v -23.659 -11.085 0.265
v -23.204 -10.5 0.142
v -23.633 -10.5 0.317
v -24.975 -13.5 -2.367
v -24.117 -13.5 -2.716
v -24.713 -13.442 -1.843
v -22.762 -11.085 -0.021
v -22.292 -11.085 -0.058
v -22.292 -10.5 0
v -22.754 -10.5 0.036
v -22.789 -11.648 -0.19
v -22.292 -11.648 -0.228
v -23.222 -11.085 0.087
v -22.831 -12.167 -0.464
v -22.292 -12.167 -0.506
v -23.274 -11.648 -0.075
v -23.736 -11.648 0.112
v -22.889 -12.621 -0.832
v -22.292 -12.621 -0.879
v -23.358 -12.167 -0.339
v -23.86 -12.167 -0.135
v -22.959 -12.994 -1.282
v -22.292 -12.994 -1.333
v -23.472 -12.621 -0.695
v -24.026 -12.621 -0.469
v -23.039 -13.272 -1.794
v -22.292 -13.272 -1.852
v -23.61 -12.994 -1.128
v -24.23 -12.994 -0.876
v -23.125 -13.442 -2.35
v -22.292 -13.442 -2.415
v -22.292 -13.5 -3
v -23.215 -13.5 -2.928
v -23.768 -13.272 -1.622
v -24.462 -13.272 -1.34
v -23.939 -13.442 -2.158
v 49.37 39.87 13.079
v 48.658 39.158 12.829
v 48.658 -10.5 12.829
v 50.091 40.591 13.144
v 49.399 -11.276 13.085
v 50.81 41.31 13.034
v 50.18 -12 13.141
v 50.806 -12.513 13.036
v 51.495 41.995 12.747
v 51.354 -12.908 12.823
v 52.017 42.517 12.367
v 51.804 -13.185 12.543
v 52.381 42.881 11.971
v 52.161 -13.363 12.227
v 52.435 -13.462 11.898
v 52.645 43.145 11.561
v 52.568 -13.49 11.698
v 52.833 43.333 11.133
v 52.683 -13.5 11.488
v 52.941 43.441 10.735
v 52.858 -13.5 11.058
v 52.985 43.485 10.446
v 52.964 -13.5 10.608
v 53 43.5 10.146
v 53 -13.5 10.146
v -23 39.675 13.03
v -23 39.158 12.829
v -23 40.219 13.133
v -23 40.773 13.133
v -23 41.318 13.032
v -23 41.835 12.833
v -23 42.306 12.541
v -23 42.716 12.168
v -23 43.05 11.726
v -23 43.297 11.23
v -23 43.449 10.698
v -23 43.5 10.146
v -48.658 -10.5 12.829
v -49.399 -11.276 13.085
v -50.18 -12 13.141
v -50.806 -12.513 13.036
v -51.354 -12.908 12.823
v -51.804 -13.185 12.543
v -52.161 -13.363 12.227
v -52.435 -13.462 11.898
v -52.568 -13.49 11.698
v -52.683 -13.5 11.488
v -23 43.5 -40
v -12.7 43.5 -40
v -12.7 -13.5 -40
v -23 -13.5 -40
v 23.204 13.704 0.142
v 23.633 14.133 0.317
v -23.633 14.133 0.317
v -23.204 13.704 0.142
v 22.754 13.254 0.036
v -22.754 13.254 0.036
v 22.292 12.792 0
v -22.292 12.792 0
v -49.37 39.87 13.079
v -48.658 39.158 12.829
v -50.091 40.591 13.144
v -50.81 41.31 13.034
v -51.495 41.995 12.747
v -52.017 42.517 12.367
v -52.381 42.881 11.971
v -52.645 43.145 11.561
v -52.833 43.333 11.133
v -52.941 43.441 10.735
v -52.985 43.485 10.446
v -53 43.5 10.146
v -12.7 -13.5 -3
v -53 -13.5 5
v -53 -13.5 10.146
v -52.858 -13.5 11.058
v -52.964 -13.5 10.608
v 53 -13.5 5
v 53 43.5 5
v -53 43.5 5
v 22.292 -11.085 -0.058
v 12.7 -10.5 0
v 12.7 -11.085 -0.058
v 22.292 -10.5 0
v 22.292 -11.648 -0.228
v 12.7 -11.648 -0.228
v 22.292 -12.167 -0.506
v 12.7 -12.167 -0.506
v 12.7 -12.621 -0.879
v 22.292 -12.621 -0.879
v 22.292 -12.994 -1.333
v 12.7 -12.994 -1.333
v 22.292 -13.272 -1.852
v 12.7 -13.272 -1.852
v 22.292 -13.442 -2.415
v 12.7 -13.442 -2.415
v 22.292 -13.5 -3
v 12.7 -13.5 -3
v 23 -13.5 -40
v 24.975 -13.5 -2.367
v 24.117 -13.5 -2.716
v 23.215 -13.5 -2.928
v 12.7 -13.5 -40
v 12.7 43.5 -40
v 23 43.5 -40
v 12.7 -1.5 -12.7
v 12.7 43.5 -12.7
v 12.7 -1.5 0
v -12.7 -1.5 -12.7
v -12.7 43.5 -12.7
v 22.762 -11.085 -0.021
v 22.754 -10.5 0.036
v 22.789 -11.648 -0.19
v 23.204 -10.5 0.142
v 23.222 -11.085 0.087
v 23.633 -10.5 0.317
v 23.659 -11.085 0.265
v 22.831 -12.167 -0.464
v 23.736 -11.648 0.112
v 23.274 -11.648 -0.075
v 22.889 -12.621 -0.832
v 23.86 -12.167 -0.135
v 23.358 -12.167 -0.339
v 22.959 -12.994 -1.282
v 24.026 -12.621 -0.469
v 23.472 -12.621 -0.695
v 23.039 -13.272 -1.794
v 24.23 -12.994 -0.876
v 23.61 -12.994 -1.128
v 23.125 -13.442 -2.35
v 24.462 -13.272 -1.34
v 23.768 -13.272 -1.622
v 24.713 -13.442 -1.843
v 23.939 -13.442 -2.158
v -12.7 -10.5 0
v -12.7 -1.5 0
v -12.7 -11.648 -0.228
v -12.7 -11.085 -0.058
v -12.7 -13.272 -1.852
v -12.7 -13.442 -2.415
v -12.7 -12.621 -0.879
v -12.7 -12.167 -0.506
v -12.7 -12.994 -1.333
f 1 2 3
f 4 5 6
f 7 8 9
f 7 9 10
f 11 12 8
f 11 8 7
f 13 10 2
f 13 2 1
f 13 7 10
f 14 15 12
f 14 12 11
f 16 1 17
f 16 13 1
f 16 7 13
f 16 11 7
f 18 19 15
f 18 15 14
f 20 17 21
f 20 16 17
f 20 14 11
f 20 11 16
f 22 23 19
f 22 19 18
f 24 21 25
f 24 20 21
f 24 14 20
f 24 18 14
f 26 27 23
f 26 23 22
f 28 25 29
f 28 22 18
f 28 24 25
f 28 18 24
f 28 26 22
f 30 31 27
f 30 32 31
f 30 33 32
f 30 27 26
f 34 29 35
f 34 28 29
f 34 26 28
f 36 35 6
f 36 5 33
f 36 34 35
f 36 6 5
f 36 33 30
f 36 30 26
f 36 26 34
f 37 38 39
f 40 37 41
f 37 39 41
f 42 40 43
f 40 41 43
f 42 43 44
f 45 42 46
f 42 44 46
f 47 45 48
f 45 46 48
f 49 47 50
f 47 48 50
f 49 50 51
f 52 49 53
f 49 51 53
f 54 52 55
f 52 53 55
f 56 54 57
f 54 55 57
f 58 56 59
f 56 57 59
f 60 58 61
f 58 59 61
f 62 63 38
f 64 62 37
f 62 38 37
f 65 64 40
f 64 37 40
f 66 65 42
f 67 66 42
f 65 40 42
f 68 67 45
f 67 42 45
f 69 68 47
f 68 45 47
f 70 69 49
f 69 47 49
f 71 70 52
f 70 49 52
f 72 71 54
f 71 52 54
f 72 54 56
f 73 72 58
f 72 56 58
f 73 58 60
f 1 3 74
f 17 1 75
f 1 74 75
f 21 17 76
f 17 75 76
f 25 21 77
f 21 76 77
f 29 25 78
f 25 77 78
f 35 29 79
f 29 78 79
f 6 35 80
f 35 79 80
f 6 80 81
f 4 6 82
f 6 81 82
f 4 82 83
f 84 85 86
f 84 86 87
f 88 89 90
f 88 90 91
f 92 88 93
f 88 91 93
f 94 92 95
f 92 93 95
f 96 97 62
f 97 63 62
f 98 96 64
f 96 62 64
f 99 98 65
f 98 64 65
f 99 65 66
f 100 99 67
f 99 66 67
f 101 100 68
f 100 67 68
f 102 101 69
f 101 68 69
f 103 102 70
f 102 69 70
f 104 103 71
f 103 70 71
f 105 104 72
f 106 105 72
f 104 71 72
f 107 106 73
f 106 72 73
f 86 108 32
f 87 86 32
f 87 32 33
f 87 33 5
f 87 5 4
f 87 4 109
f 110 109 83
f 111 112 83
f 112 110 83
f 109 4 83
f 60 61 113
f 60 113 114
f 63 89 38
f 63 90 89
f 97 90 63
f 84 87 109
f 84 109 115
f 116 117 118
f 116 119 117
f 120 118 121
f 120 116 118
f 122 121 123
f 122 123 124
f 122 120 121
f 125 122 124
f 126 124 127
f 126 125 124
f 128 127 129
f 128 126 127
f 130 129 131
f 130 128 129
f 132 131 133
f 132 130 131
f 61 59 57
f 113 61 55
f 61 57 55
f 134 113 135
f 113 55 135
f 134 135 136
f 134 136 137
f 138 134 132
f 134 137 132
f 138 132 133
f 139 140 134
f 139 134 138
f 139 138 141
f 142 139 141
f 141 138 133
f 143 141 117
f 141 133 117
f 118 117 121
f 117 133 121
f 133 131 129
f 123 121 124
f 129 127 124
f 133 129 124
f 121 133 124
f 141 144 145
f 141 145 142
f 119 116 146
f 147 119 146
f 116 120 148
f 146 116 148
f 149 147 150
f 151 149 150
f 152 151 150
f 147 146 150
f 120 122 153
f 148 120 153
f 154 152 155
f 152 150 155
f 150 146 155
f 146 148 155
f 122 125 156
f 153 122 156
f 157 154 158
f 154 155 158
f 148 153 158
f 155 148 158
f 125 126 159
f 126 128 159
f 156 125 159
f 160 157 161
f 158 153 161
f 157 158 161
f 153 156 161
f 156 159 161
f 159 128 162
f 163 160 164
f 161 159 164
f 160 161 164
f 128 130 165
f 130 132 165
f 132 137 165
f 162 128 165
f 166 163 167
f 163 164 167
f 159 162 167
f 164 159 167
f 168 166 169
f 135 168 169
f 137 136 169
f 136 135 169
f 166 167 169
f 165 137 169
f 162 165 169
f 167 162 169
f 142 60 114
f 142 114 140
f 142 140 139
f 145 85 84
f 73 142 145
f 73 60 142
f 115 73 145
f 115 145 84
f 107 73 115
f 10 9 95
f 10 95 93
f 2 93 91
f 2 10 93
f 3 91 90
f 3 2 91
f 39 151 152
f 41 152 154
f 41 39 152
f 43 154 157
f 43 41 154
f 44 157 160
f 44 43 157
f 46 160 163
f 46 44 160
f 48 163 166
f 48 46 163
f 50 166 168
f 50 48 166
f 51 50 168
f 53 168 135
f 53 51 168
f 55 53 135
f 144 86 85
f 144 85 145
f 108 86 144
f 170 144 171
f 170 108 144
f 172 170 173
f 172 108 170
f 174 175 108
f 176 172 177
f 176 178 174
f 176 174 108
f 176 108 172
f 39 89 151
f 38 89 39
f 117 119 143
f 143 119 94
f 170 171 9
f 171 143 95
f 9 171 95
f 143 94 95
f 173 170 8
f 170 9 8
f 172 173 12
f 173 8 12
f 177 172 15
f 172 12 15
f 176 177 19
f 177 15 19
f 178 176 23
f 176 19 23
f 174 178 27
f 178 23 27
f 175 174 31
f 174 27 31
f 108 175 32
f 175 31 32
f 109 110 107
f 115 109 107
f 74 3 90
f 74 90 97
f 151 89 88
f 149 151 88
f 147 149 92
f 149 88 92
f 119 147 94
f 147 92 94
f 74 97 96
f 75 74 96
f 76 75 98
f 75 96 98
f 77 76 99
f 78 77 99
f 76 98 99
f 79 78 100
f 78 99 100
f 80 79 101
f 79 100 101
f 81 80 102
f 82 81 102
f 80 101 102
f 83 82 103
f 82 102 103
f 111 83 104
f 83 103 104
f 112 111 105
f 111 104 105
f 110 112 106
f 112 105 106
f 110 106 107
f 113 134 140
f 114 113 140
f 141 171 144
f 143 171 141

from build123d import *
from OCP.BRepFilletAPI import BRepFilletAPI_MakeChamfer

# Parameters (mm, degrees)
BOSS_EXTRUDE1_DEPTH = 15
SKETCH4_W           = 106
SKETCH4_H           = 57
BOSS_EXTRUDE3_DEPTH = 40
SKETCH5_W           = 25.4
SKETCH5_H           = 12.7
CUT_EXTRUDE3_DEPTH  = 12
SKETCH5_3_W         = 25.4
SKETCH5_3_H         = 27.3
CUT_EXTRUDE4_DEPTH  = 88.509999429
CHAMFER3_SIZE       = 45
CHAMFER3_SIZE2      = 30
FILLET2_R           = 3


with BuildPart() as part:
    # Sketch1 → Boss-Extrude1 (new body)
    with BuildSketch(Plane.XY):
        Polygon((23, -13.5), (53, -13.5), (53, 43.5), (-53, 43.5), (-53, -13.5), (-23, -13.5), (-23, 13.5), (23, 13.5), align=None)
    extrude(amount=BOSS_EXTRUDE1_DEPTH)

    # Chamfer1
    # the kernel refuses this chamfer: 30, 15 mm, written as the material it takes off along each edge
    with BuildSketch(Plane(origin=(23, 13.5, 15), x_dir=(-0.06891834360170887, 0, -0.9976223042390325), z_dir=(0, -1, 0)), Plane(origin=(-23, -13.5, 15), x_dir=(0.06891834360170887, 0, -0.9976223042390325), z_dir=(0, 1, 0))) as chamfer1_piece_1:
        with BuildLine():
            Line((15.573685801, 0), (-2.676901546, 30.962444281))
            Line((-2.676901546, 30.962444281), (-3.275474928, 30.921093275))
            ThreePointArc((-3.275474928, 30.921093275), (-1.669334001, 15.458363867), (-0.598573383, -0.041351006))
            Line((-0.598573383, -0.041351006), (0.041351006, -0.598573383))
            ThreePointArc((0.041351006, -0.598573383), (7.791208443, -0.063193073), (15.615036807, -0.598573383))
            Line((15.615036807, -0.598573383), (15.573685801, 0))
        make_face()
    extrude(amount=27, mode=Mode.SUBTRACT)
    with BuildSketch(Plane(origin=(-23, 13.5, 15), x_dir=(0, -0.06891834360170876, -0.9976223042390325), z_dir=(1, 0, 0))) as chamfer1_piece_2:
        with BuildLine():
            Line((15.573685801, 0), (-2.676901546, 30.962444281))
            Line((-2.676901546, 30.962444281), (-3.275474928, 30.921093275))
            ThreePointArc((-3.275474928, 30.921093275), (-1.669334001, 15.458363867), (-0.598573383, -0.041351006))
            Line((-0.598573383, -0.041351006), (0.041351006, -0.598573383))
            ThreePointArc((0.041351006, -0.598573383), (7.791208443, -0.063193073), (15.615036807, -0.598573383))
            Line((15.615036807, -0.598573383), (15.573685801, 0))
        make_face()
    extrude(amount=46, mode=Mode.SUBTRACT)
    with BuildSketch(Plane(origin=(-23, 13.5, 15), x_dir=(0, -0.06891834360170876, -0.9976223042390325), z_dir=(1, 0, 0))) as chamfer1_piece_3a_section:
        with BuildLine():
            Line((15.573685801, 0), (-2.676901546, 30.962444281))
            Line((-2.676901546, 30.962444281), (-3.275474928, 30.921093275))
            ThreePointArc((-3.275474928, 30.921093275), (-1.669334001, 15.458363867), (-0.598573383, -0.041351006))
            Line((-0.598573383, -0.041351006), (0.041351006, -0.598573383))
            ThreePointArc((0.041351006, -0.598573383), (7.791208443, -0.063193073), (15.615036807, -0.598573383))
            Line((15.615036807, -0.598573383), (15.573685801, 0))
        make_face()
    chamfer1_piece_3a = extrude(amount=123.694866214, mode=Mode.PRIVATE)
    chamfer1_piece_3a = split(chamfer1_piece_3a, bisect_by=Plane(origin=(23, 23.617605247, 10.241766787), z_dir=(1, 0, 0)), keep=Keep.TOP, mode=Mode.PRIVATE)
    with BuildSketch(Plane(origin=(23, 91.194866214, 15), x_dir=(-0.06891834360170887, 0, -0.9976223042390325), z_dir=(0, -1, 0))) as chamfer1_piece_3b_section:
        with BuildLine():
            Line((15.573685801, 0), (-2.676901546, 30.962444281))
            Line((-2.676901546, 30.962444281), (-3.275474928, 30.921093275))
            ThreePointArc((-3.275474928, 30.921093275), (-1.669334001, 15.458363867), (-0.598573383, -0.041351006))
            Line((-0.598573383, -0.041351006), (0.041351006, -0.598573383))
            ThreePointArc((0.041351006, -0.598573383), (7.791208443, -0.063193073), (15.615036807, -0.598573383))
            Line((15.615036807, -0.598573383), (15.573685801, 0))
        make_face()
    chamfer1_piece_3b = extrude(amount=104.694866214, mode=Mode.PRIVATE)
    chamfer1_piece_3b = split(chamfer1_piece_3b, bisect_by=Plane(origin=(33.117605247, 13.5, 10.241766787), z_dir=(0, 1, 0)), keep=Keep.TOP, mode=Mode.PRIVATE)
    chamfer1_piece_3 = chamfer1_piece_3a & chamfer1_piece_3b
    add(chamfer1_piece_3, mode=Mode.SUBTRACT)
    with BuildSketch(Plane(origin=(-23, -13.5, 15), x_dir=(0.06891834360170887, 0, -0.9976223042390325), z_dir=(0, 1, 0))) as chamfer1_piece_4a_section:
        with BuildLine():
            Line((15.573685801, 0), (-2.676901546, 30.962444281))
            Line((-2.676901546, 30.962444281), (-3.275474928, 30.921093275))
            ThreePointArc((-3.275474928, 30.921093275), (-1.669334001, 15.458363867), (-0.598573383, -0.041351006))
            Line((-0.598573383, -0.041351006), (0.041351006, -0.598573383))
            ThreePointArc((0.041351006, -0.598573383), (7.791208443, -0.063193073), (15.615036807, -0.598573383))
            Line((15.615036807, -0.598573383), (15.573685801, 0))
        make_face()
    chamfer1_piece_4a = extrude(amount=104.694866214, mode=Mode.PRIVATE)
    chamfer1_piece_4a = split(chamfer1_piece_4a, bisect_by=Plane(origin=(-33.117605247, 13.5, 10.241766787), z_dir=(0, 1, 0)), keep=Keep.TOP, mode=Mode.PRIVATE)
    with BuildSketch(Plane(origin=(-100.694866214, 13.5, 15), x_dir=(0, -0.06891834360170876, -0.9976223042390325), z_dir=(1, 0, 0))) as chamfer1_piece_4b_section:
        with BuildLine():
            Line((15.573685801, 0), (-2.676901546, 30.962444281))
            Line((-2.676901546, 30.962444281), (-3.275474928, 30.921093275))
            ThreePointArc((-3.275474928, 30.921093275), (-1.669334001, 15.458363867), (-0.598573383, -0.041351006))
            Line((-0.598573383, -0.041351006), (0.041351006, -0.598573383))
            ThreePointArc((0.041351006, -0.598573383), (7.791208443, -0.063193073), (15.615036807, -0.598573383))
            Line((15.615036807, -0.598573383), (15.573685801, 0))
        make_face()
    chamfer1_piece_4b = extrude(amount=123.694866214, mode=Mode.PRIVATE)
    chamfer1_piece_4b = split(chamfer1_piece_4b, bisect_by=Plane(origin=(-23, 23.617605247, 10.241766787), z_dir=(-1, 0, 0)), keep=Keep.TOP, mode=Mode.PRIVATE)
    chamfer1_piece_4 = chamfer1_piece_4a & chamfer1_piece_4b
    add(chamfer1_piece_4, mode=Mode.SUBTRACT)

    # Sketch4 → Boss-Extrude3 (add)
    with BuildSketch(Plane(origin=(0, 0, 0), x_dir=(-1, 0, 0), z_dir=(0, 0, -1))):
        with Locations((0, 15)):
            Rectangle(SKETCH4_W, SKETCH4_H)
    extrude(amount=BOSS_EXTRUDE3_DEPTH)

    # Sketch5 → Cut-Extrude3 (cut)
    with BuildSketch(Plane.XZ.offset(13.5)):
        with Locations((0, -6.35)):
            Rectangle(SKETCH5_W, SKETCH5_H)
    extrude(amount=-CUT_EXTRUDE3_DEPTH, mode=Mode.SUBTRACT)

    # Sketch5<3> → Cut-Extrude4 (cut, through all)
    with BuildSketch(Plane.XZ.offset(13.5)):
        with Locations((0, -26.35)):
            Rectangle(SKETCH5_3_W, SKETCH5_3_H)
    extrude(amount=-CUT_EXTRUDE4_DEPTH, mode=Mode.SUBTRACT)

    # Chamfer3: one chamfer whose edges measure the first distance from different faces: ONE call of the kernel's chamfer builder (chamfer() names one face for all edges)
    chamfer3_edges_1 = [part.edges().sort_by_distance(p)[0] for p in [
        (53, 15, -40),
    ]]
    chamfer3_side_1 = [part.faces().sort_by_distance(p)[0] for p in [
        (53, 15, -12.5),
    ]]
    chamfer3_edges_2 = [part.edges().sort_by_distance(p)[0] for p in [
        (-53, 15, -40),
    ]]
    chamfer3_side_2 = [part.faces().sort_by_distance(p)[0] for p in [
        (-53, 15, -12.5),
    ]]
    chamfer3 = BRepFilletAPI_MakeChamfer(part.part.solid().wrapped)
    for e in chamfer3_edges_1:
        chamfer3.Add(CHAMFER3_SIZE, CHAMFER3_SIZE2, e.wrapped, chamfer3_side_1[0].wrapped)  # the first distance lies on this face
    for e in chamfer3_edges_2:
        chamfer3.Add(CHAMFER3_SIZE, CHAMFER3_SIZE2, e.wrapped, chamfer3_side_2[0].wrapped)  # the first distance lies on this face
    add(Compound.cast(chamfer3.Shape()), mode=Mode.REPLACE)

    # Fillet2
    fillet2_edges = [part.edges().sort_by_distance(p)[0] for p in [
        (23, 0, 0),
        (0, 13.5, 0),
        (-23, 0, 0),
    ]]
    fillet(fillet2_edges, radius=FILLET2_R)
    fillet2_2_edges = [part.edges().sort_by_distance(p)[0] for p in [
        (53, 15, 15),
        (0, 43.5, 15),
        (-53, 15, 15),
        (38.316718427, -13.5, 7.658359213),
        (-38.316718427, -13.5, 7.658359213),
        (17.495898034, -13.5, 0),
        (-17.495898034, -13.5, 0),
        (-22.981054829, -13.5, 0.080253032),
        (22.981054829, -13.5, 0.080253032),
    ]]
    fillet(fillet2_2_edges, radius=FILLET2_R)


solid = part.part
